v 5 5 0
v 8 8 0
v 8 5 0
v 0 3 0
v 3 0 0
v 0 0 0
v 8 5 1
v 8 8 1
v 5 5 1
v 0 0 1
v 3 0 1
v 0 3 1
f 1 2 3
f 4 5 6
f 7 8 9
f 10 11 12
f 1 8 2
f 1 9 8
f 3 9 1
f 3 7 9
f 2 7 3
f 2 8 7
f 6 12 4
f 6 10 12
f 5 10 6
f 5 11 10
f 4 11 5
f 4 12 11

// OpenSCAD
// two separate islands in one polygon
linear_extrude(1)
  polygon(points = [[0, 0], [3, 0], [0, 3], [5, 5], [8, 5], [8, 8]],
          paths = [[0, 1, 2], [3, 4, 5]]);
